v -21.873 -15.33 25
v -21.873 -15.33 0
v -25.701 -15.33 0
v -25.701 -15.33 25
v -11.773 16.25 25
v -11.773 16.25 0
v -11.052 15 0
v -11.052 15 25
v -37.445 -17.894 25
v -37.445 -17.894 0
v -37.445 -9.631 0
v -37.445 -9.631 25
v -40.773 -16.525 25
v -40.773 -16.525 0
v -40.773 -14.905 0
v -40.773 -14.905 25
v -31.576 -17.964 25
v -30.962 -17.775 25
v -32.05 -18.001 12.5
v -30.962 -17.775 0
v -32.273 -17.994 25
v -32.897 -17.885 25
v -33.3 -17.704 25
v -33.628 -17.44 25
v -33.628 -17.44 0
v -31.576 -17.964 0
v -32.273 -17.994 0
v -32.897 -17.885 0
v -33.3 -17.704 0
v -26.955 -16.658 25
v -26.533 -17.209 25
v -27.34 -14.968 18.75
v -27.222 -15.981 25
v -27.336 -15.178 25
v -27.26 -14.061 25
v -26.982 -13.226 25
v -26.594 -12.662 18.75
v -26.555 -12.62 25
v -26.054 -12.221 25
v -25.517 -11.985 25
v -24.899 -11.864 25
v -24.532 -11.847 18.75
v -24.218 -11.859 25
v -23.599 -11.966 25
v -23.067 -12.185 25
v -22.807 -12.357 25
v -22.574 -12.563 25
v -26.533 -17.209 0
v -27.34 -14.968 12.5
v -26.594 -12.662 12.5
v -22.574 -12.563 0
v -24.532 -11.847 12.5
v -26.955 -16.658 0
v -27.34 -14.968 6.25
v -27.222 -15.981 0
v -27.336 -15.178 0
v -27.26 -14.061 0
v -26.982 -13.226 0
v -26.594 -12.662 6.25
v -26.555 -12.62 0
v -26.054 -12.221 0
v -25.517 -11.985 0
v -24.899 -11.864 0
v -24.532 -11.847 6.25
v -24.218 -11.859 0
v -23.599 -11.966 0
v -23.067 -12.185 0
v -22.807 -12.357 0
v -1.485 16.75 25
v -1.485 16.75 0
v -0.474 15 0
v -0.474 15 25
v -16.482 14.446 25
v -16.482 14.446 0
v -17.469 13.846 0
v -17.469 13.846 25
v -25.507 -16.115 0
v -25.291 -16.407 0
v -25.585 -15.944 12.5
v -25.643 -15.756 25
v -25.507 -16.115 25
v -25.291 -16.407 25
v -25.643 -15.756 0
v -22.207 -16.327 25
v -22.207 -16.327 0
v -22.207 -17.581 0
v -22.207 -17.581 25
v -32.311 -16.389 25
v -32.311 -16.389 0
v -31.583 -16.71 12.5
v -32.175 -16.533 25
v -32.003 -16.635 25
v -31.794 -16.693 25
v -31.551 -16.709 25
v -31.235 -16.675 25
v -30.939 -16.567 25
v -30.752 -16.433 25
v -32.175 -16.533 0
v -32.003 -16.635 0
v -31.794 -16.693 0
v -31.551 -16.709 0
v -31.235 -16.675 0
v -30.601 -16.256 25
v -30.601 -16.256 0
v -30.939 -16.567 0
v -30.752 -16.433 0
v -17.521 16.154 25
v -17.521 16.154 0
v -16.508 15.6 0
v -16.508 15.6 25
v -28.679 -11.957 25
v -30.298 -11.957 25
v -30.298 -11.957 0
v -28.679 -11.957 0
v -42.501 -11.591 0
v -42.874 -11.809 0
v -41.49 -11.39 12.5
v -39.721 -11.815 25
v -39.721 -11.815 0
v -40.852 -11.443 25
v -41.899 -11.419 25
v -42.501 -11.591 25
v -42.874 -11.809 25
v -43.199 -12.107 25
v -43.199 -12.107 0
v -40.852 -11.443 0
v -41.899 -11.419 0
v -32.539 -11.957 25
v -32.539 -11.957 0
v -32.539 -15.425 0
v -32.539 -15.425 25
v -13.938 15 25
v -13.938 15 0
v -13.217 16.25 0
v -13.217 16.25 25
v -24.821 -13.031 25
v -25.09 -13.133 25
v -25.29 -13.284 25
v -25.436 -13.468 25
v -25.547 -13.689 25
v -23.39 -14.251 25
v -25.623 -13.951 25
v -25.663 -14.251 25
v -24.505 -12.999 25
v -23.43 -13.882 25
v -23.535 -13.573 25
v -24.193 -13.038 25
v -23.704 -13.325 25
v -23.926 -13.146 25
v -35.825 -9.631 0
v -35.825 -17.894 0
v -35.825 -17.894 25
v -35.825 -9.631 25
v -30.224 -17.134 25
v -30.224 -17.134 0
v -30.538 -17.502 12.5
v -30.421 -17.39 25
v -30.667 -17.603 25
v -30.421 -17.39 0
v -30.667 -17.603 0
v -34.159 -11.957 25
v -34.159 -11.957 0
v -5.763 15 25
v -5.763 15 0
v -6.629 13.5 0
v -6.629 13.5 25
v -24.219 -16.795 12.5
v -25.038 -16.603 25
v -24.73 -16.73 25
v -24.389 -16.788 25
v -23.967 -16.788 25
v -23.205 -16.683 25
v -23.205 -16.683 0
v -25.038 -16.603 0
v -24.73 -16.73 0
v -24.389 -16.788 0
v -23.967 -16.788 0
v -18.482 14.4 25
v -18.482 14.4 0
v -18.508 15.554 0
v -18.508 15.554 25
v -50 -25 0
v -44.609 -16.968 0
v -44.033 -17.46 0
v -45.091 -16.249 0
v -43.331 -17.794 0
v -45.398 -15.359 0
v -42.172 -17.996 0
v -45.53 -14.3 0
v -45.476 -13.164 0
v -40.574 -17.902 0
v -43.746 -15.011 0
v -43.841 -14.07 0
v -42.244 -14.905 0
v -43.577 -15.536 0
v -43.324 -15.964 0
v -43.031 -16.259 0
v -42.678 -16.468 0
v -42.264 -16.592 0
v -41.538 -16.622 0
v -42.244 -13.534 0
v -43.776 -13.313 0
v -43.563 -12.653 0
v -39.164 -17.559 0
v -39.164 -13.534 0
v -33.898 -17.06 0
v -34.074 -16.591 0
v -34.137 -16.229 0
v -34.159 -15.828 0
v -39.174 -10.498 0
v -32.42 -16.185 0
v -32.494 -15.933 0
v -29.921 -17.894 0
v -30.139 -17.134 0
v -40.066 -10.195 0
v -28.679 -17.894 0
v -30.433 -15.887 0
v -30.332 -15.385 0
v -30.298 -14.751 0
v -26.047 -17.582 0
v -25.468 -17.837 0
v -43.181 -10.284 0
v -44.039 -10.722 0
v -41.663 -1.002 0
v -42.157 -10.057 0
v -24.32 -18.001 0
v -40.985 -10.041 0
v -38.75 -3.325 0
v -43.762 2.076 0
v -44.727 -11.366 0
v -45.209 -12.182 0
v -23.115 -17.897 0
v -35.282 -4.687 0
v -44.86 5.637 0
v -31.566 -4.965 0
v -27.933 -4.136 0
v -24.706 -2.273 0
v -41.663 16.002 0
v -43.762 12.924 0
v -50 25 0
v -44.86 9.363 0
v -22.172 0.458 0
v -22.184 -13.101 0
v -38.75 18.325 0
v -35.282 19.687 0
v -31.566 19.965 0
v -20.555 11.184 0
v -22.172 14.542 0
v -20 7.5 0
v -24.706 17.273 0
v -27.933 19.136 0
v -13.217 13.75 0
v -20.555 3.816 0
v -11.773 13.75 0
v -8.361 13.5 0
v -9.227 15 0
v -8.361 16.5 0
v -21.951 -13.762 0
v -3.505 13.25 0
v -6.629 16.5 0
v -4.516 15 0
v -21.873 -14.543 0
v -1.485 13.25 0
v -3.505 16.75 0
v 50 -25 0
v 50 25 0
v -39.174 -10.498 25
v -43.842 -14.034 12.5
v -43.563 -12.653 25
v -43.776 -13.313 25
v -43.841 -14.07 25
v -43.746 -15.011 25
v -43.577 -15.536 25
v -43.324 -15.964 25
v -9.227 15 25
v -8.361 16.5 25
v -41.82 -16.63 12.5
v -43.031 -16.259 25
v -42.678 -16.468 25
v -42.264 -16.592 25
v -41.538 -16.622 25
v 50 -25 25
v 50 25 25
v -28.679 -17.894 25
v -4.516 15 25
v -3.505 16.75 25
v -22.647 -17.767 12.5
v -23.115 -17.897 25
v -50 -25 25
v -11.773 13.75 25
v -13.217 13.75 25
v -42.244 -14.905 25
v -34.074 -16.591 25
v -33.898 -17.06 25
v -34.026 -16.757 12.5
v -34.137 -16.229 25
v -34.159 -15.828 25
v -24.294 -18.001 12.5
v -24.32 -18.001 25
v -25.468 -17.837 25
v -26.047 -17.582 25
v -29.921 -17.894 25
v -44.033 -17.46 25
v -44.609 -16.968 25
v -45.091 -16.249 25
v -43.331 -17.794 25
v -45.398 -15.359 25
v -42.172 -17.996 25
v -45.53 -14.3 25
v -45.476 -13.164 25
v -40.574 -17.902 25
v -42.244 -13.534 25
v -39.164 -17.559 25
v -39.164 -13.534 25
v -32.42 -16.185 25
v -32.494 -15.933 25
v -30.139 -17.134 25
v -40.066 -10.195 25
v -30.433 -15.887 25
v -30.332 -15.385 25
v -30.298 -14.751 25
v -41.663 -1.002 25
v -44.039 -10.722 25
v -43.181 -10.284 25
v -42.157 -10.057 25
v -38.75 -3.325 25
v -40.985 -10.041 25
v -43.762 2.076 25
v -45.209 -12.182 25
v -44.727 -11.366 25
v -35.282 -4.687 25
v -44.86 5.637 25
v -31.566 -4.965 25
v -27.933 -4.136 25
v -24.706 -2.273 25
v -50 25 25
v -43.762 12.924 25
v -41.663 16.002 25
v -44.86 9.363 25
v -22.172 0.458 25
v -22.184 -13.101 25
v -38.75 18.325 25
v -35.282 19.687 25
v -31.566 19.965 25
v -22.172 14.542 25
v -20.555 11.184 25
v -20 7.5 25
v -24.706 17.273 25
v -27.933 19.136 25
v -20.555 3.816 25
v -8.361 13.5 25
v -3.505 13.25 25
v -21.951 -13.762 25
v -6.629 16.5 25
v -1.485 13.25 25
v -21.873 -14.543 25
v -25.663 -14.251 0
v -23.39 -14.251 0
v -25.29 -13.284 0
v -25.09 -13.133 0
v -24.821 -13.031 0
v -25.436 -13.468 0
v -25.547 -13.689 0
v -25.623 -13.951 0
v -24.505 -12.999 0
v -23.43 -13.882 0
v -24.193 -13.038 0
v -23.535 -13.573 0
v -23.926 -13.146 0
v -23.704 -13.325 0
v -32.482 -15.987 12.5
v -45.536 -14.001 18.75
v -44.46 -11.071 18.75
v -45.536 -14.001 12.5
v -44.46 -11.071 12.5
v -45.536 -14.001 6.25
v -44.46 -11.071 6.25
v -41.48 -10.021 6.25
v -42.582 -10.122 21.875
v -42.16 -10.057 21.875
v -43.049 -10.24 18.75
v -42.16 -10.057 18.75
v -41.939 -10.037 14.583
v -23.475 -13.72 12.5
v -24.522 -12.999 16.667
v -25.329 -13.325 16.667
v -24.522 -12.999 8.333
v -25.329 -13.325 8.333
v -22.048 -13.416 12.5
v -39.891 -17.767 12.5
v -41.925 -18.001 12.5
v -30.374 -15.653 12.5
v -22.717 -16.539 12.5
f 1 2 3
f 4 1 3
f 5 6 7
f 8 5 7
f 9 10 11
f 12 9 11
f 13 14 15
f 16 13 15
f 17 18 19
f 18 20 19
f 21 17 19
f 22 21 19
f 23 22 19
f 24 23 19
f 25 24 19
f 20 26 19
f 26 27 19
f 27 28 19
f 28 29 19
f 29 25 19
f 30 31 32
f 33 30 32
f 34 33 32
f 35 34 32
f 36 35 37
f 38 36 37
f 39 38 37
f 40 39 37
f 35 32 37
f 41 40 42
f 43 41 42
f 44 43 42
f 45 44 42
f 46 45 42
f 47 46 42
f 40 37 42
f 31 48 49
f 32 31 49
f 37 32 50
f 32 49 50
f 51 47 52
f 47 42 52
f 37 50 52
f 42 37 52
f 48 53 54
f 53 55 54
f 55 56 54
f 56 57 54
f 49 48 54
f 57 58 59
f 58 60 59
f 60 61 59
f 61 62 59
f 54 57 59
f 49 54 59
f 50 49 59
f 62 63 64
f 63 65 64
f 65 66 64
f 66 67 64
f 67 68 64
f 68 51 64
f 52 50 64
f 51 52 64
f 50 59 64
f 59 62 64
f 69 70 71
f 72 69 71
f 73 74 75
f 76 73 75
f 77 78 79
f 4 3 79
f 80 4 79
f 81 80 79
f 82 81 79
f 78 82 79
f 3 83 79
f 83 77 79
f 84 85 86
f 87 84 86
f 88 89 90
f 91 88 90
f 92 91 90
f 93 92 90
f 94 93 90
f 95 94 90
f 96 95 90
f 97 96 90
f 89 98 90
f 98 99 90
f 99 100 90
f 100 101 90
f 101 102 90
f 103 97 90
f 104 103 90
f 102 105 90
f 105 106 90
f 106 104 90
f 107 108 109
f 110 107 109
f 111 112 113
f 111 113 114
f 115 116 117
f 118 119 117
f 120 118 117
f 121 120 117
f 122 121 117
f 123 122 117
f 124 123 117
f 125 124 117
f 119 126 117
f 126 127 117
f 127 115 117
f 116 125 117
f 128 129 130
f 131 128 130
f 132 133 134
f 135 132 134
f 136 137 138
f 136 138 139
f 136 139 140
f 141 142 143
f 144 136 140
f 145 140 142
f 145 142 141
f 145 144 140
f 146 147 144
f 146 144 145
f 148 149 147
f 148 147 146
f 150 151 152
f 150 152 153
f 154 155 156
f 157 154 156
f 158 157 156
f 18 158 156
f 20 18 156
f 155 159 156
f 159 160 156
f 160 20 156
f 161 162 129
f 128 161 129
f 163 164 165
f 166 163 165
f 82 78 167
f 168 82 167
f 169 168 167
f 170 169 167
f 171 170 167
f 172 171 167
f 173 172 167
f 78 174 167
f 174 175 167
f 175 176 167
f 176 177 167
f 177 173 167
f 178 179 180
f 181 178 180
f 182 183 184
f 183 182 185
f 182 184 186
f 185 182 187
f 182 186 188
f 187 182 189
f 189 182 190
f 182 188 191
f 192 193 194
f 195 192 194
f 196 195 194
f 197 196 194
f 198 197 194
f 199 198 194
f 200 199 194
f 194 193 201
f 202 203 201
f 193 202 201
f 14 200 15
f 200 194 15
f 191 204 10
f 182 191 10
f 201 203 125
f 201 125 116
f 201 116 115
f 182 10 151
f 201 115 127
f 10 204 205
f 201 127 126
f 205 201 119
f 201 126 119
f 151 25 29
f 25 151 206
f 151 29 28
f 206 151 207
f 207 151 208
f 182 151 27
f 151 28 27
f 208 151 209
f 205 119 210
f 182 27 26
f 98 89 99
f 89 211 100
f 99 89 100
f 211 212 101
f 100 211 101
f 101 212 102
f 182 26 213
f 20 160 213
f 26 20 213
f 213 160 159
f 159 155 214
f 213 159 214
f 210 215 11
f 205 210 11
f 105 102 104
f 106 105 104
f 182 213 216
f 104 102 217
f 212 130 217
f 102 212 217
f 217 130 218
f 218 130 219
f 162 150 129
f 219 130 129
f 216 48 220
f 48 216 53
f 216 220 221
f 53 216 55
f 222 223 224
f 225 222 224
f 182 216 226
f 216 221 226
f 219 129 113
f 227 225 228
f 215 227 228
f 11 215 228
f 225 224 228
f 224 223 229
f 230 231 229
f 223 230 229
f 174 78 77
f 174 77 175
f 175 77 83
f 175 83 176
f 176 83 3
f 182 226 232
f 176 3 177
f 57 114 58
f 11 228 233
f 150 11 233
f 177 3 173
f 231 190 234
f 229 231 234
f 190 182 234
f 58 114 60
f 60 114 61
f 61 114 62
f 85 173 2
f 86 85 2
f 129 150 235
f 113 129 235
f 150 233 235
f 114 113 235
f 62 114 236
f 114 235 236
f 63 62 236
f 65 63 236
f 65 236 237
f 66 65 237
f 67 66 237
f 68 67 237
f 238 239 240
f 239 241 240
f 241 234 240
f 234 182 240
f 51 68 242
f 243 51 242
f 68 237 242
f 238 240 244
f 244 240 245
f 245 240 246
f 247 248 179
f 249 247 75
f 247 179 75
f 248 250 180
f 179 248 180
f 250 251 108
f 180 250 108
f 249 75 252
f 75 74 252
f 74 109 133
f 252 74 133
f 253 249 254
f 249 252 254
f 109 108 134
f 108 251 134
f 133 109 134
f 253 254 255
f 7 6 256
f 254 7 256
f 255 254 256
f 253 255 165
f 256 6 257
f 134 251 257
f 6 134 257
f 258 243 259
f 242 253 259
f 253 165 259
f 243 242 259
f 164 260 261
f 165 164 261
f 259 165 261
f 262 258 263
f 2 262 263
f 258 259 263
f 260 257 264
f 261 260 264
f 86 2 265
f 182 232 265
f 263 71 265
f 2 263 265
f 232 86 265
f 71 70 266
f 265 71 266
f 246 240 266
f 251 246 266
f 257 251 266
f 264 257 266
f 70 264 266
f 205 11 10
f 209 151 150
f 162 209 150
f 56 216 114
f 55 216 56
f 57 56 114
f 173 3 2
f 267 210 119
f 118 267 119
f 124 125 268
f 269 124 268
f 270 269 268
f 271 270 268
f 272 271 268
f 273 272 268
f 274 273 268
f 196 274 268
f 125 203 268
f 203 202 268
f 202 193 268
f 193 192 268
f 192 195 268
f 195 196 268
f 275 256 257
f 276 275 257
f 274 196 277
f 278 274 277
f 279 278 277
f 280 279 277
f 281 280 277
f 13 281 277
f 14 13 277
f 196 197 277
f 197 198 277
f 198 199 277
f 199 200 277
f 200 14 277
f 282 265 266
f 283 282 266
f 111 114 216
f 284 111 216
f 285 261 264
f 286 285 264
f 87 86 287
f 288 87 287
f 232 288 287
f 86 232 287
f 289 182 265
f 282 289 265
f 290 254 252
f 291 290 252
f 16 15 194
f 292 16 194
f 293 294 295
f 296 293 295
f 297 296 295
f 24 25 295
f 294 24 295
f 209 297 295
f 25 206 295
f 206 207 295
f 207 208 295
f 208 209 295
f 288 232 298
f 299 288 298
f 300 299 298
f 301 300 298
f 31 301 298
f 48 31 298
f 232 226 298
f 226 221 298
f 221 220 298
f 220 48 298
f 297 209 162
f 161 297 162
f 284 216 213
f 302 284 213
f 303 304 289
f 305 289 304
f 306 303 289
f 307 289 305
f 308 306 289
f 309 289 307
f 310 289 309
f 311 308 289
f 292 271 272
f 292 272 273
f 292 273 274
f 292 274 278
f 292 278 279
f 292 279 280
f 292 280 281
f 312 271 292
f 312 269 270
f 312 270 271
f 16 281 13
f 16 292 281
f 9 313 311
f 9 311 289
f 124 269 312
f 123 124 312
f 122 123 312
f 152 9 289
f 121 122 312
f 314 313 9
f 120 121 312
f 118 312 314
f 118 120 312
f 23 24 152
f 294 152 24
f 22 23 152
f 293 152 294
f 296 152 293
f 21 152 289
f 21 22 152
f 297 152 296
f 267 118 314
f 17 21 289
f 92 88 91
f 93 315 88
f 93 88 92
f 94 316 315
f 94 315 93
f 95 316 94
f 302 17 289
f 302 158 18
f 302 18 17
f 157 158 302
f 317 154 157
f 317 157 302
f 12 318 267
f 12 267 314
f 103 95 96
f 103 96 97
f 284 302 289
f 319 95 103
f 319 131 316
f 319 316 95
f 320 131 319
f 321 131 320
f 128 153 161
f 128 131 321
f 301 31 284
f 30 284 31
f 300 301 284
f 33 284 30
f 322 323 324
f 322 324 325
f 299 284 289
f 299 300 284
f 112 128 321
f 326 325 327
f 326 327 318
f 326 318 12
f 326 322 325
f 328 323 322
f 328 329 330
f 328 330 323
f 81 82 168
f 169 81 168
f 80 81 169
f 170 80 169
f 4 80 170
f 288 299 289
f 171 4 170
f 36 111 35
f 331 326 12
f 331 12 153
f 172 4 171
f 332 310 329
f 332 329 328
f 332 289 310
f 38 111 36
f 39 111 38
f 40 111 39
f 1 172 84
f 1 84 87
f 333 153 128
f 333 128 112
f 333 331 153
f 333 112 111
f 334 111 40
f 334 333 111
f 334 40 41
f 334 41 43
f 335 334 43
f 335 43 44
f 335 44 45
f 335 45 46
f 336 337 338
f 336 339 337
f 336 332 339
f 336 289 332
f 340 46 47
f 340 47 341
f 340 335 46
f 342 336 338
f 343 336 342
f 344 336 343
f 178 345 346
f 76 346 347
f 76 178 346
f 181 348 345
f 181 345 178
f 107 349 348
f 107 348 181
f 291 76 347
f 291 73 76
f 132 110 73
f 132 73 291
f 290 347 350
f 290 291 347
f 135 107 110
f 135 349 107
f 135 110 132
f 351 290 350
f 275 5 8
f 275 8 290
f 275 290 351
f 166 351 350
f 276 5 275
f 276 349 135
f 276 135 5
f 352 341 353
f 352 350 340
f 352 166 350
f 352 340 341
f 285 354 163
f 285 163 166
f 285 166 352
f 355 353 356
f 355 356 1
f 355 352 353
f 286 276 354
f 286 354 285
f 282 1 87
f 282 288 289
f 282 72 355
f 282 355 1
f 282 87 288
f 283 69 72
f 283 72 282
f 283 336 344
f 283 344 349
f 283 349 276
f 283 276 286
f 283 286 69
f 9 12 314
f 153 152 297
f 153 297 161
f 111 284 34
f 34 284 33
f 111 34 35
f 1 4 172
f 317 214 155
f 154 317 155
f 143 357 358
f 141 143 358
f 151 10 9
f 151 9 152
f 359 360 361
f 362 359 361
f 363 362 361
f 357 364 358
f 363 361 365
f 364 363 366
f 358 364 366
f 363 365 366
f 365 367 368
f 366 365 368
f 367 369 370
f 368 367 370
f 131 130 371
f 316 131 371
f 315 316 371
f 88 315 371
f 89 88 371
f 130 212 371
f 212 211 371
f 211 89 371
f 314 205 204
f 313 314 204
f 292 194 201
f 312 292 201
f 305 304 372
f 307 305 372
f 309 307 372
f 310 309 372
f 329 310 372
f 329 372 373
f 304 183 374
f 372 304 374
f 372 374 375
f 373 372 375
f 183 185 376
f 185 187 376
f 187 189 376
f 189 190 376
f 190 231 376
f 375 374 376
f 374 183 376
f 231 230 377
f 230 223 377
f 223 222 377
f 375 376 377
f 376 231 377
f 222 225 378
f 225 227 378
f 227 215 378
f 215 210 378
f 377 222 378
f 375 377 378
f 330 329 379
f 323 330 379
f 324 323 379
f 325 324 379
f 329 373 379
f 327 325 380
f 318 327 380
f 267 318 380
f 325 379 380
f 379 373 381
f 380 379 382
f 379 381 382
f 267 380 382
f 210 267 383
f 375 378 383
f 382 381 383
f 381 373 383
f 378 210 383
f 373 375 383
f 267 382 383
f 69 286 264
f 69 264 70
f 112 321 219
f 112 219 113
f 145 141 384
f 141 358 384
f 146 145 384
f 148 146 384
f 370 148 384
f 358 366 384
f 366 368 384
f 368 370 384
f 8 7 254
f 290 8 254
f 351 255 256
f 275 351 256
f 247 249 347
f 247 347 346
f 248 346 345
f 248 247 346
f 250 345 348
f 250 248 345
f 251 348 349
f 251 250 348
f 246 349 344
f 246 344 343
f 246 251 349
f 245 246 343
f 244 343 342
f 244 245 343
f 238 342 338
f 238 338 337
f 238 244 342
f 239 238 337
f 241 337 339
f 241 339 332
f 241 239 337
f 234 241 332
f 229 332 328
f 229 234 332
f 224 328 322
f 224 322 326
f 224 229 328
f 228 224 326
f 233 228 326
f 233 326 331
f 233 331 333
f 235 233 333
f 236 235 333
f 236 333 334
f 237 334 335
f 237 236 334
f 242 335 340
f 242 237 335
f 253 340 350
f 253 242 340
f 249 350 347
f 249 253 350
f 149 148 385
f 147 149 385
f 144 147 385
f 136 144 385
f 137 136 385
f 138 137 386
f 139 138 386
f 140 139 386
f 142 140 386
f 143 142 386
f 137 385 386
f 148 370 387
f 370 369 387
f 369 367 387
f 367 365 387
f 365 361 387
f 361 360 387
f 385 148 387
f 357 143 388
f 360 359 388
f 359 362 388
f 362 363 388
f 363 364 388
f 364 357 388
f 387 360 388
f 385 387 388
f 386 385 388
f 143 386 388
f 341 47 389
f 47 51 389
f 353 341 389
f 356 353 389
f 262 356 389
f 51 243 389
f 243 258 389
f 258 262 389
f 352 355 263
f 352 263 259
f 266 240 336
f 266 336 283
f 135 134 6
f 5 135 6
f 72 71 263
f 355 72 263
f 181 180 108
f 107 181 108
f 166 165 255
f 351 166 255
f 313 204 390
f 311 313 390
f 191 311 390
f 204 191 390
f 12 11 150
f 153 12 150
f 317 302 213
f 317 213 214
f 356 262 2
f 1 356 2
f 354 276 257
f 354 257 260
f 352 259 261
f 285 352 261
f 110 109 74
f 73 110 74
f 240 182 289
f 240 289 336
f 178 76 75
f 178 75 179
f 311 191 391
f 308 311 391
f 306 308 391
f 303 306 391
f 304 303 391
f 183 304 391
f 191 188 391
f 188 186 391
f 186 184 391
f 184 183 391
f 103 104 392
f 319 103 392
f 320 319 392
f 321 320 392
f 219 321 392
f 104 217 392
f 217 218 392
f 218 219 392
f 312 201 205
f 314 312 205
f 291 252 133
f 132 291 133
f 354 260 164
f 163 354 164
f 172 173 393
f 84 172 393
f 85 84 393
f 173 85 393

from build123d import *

# Parameters (mm, degrees)
F0_W     = 100
F0_H     = 50
F0_W_2   = 1.6192061982
F0_H_2   = 8.2625390784
F0_R     = 12.5
F1_DEPTH = 25


with BuildPart() as f1:
    # F0 (on Top) → F1 (new body)
    with BuildSketch(Plane.XY):
        Rectangle(F0_W, F0_H)
        with BuildLine():
            Line((-42.2444701954, -14.905312297), (-42.2444701954, -13.534169168))
            Line((-42.2444701954, -13.534169168), (-39.164070576, -13.534169168))
            Line((-39.164070576, -13.534169168), (-39.164070576, -17.5592473249))
            add(Edge.make_bspline(
                [(-39.164070576, -17.5592473249), (-39.9133569699, -17.8039122698), (-40.5742921337, -17.9024578727)],
                knots=[0, 0, 0, 1, 1, 1], degree=2))
            add(Edge.make_bspline(
                [(-40.5742921337, -17.9024578727), (-41.2352272975, -18.0010034755), (-41.9250465173, -18.0010034755)],
                knots=[0, 0, 0, 1, 1, 1], degree=2))
            add(Edge.make_bspline(
                [(-41.9250465173, -18.0010034755), (-43.681876747, -18.0010034755), (-44.6087151322, -16.9679737079)],
                knots=[0, 0, 0, 1, 1, 1], degree=2))
            add(Edge.make_bspline(
                [(-44.6087151322, -16.9679737079), (-45.5355535174, -15.9349439404), (-45.5355535174, -14.0014112504)],
                knots=[0, 0, 0, 1, 1, 1], degree=2))
            add(Edge.make_bspline(
                [(-45.5355535174, -14.0014112504), (-45.5355535174, -12.1222485482), (-44.4600471969, -11.0713786284)],
                knots=[0, 0, 0, 1, 1, 1], degree=2))
            add(Edge.make_bspline(
                [(-44.4600471969, -11.0713786284), (-43.3845408764, -10.0205087086), (-41.4798922425, -10.0205087086)],
                knots=[0, 0, 0, 1, 1, 1], degree=2))
            add(Edge.make_bspline(
                [(-41.4798922425, -10.0205087086), (-40.2837525116, -10.0205087086), (-39.1742649487, -10.4979451637)],
                knots=[0, 0, 0, 1, 1, 1], degree=2))
            Line((-39.1742649487, -10.4979451637), (-39.7213629506, -11.8147183049))
            add(Edge.make_bspline(
                [(-39.7213629506, -11.8147183049), (-40.5708940095, -11.3899527755), (-41.4900866152, -11.3899527755)],
                knots=[0, 0, 0, 1, 1, 1], degree=2))
            add(Edge.make_bspline(
                [(-41.4900866152, -11.3899527755), (-42.5570976251, -11.3899527755), (-43.1993431056, -12.1069569892)],
                knots=[0, 0, 0, 1, 1, 1], degree=2))
            add(Edge.make_bspline(
                [(-43.1993431056, -12.1069569892), (-43.8415885861, -12.8239612028), (-43.8415885861, -14.0336934306)],
                knots=[0, 0, 0, 1, 1, 1], degree=2))
            add(Edge.make_bspline(
                [(-43.8415885861, -14.0336934306), (-43.8415885861, -15.2977956462), (-43.3242241712, -15.9638279964)],
                knots=[0, 0, 0, 1, 1, 1], degree=2))
            add(Edge.make_bspline(
                [(-43.3242241712, -15.9638279964), (-42.8068597564, -16.6298603465), (-41.819704666, -16.6298603465)],
                knots=[0, 0, 0, 1, 1, 1], degree=2))
            add(Edge.make_bspline(
                [(-41.819704666, -16.6298603465), (-41.3031897822, -16.6298603465), (-40.7730824015, -16.5245184952)],
                knots=[0, 0, 0, 1, 1, 1], degree=2))
            Line((-40.7730824015, -16.5245184952), (-40.7730824015, -14.905312297))
            Line((-40.7730824015, -14.905312297), (-42.2444701954, -14.905312297))
        make_face(mode=Mode.SUBTRACT)
        with BuildLine():
            Line((-28.6791582476, -17.8939625621), (-29.9211726557, -17.8939625621))
            Line((-29.9211726557, -17.8939625621), (-30.1386526067, -17.1344817955))
            Line((-30.1386526067, -17.1344817955), (-30.2236057126, -17.1344817955))
            add(Edge.make_bspline(
                [(-30.2236057126, -17.1344817955), (-30.4835622166, -17.5490529522), (-30.9618482028, -17.7750282138)],
                knots=[0, 0, 0, 1, 1, 1], degree=2))
            add(Edge.make_bspline(
                [(-30.9618482028, -17.7750282138), (-31.4401341889, -18.0010034755), (-32.0500974892, -18.0010034755)],
                knots=[0, 0, 0, 1, 1, 1], degree=2))
            add(Edge.make_bspline(
                [(-32.0500974892, -18.0010034755), (-33.0967197537, -18.0010034755), (-33.6276766655, -17.4403129767)],
                knots=[0, 0, 0, 1, 1, 1], degree=2))
            add(Edge.make_bspline(
                [(-33.6276766655, -17.4403129767), (-34.1586335772, -16.8796224778), (-34.1586335772, -15.8279030269)],
                knots=[0, 0, 0, 1, 1, 1], degree=2))
            Line((-34.1586335772, -15.8279030269), (-34.1586335772, -11.9574395228))
            Line((-34.1586335772, -11.9574395228), (-32.5394273791, -11.9574395228))
            Line((-32.5394273791, -11.9574395228), (-32.5394273791, -15.4252253051))
            add(Edge.make_bspline(
                [(-32.5394273791, -15.4252253051), (-32.5394273791, -16.0674707855), (-32.3109035242, -16.3885935258)],
                knots=[0, 0, 0, 1, 1, 1], degree=2))
            add(Edge.make_bspline(
                [(-32.3109035242, -16.3885935258), (-32.0823796694, -16.709716266), (-31.5828554068, -16.709716266)],
                knots=[0, 0, 0, 1, 1, 1], degree=2))
            add(Edge.make_bspline(
                [(-31.5828554068, -16.709716266), (-30.9032305597, -16.709716266), (-30.6007975028, -16.2560666806)],
                knots=[0, 0, 0, 1, 1, 1], degree=2))
            add(Edge.make_bspline(
                [(-30.6007975028, -16.2560666806), (-30.2983644458, -15.8024170952), (-30.2983644458, -14.7506976443)],
                knots=[0, 0, 0, 1, 1, 1], degree=2))
            Line((-30.2983644458, -14.7506976443), (-30.2983644458, -11.9574395228))
            Line((-30.2983644458, -11.9574395228), (-28.6791582476, -11.9574395228))
            Line((-28.6791582476, -11.9574395228), (-28.6791582476, -17.8939625621))
        make_face(mode=Mode.SUBTRACT)
        with Locations((-36.6350166138, -13.7626930229)):
            Rectangle(F0_W_2, F0_H_2, mode=Mode.SUBTRACT)
        with BuildLine():
            add(Edge.make_bspline(
                [(-23.1147298121, -17.8973606863), (-23.5972634536, -18.0010034755), (-24.2938789218, -18.0010034755)],
                knots=[0, 0, 0, 1, 1, 1], degree=2))
            add(Edge.make_bspline(
                [(-24.2938789218, -18.0010034755), (-25.726188287, -18.0010034755), (-26.533242793, -17.2092405286)],
                knots=[0, 0, 0, 1, 1, 1], degree=2))
            add(Edge.make_bspline(
                [(-26.533242793, -17.2092405286), (-27.3402972989, -16.4174775818), (-27.3402972989, -14.9681775954)],
                knots=[0, 0, 0, 1, 1, 1], degree=2))
            add(Edge.make_bspline(
                [(-27.3402972989, -14.9681775954), (-27.3402972989, -13.476401056), (-26.5944090292, -12.6617007706)],
                knots=[0, 0, 0, 1, 1, 1], degree=2))
            add(Edge.make_bspline(
                [(-26.5944090292, -12.6617007706), (-25.8485207595, -11.8470004852), (-24.5317476183, -11.8470004852)],
                knots=[0, 0, 0, 1, 1, 1], degree=2))
            add(Edge.make_bspline(
                [(-24.5317476183, -11.8470004852), (-23.2744416512, -11.8470004852), (-22.5735785276, -12.5631551678)],
                knots=[0, 0, 0, 1, 1, 1], degree=2))
            add(Edge.make_bspline(
                [(-22.5735785276, -12.5631551678), (-21.8727154041, -13.2793098504), (-21.8727154041, -14.543412066)],
                knots=[0, 0, 0, 1, 1, 1], degree=2))
            Line((-21.8727154041, -14.543412066), (-21.8727154041, -15.3300778265))
            Line((-21.8727154041, -15.3300778265), (-25.7007023553, -15.3300778265))
            add(Edge.make_bspline(
                [(-25.7007023553, -15.3300778265), (-25.6735173614, -16.0198970462), (-25.2912283849, -16.4072832091)],
                knots=[0, 0, 0, 1, 1, 1], degree=2))
            add(Edge.make_bspline(
                [(-25.2912283849, -16.4072832091), (-24.9089394084, -16.7946693719), (-24.2191201886, -16.7946693719)],
                knots=[0, 0, 0, 1, 1, 1], degree=2))
            add(Edge.make_bspline(
                [(-24.2191201886, -16.7946693719), (-23.6822165594, -16.7946693719), (-23.2047801044, -16.6833808032)],
                knots=[0, 0, 0, 1, 1, 1], degree=2))
            add(Edge.make_bspline(
                [(-23.2047801044, -16.6833808032), (-22.7273436493, -16.5720922345), (-22.2074306413, -16.3274272896)],
                knots=[0, 0, 0, 1, 1, 1], degree=2))
            Line((-22.2074306413, -16.3274272896), (-22.2074306413, -17.5813351324))
            add(Edge.make_bspline(
                [(-22.2074306413, -17.5813351324), (-22.6321961707, -17.7937178971), (-23.1147298121, -17.8973606863)],
                knots=[0, 0, 0, 1, 1, 1], degree=2))
        make_face(mode=Mode.SUBTRACT)
        with Locations((-32.5, 7.5)):
            Circle(F0_R, mode=Mode.SUBTRACT)
        Polygon((-16.5084793183, 15.6000386243), (-16.4821071673, 14.4456392813), (-17.4686602488, 13.8456006571), (-18.4815854815, 14.3999613757), (-18.5079576325, 15.5543607187), (-17.521404551, 16.1543993429), align=None, mode=Mode.SUBTRACT)
        Polygon((-13.9384080729, 15), (-13.2167202364, 16.25), (-11.7733445634, 16.25), (-11.0516567269, 15), (-11.7733445634, 13.75), (-13.2167202364, 13.75), align=None, mode=Mode.SUBTRACT)
        Polygon((-6.6290069961, 16.5), (-5.7629815923, 15), (-6.6290069961, 13.5), (-8.3610578037, 13.5), (-9.2270832075, 15), (-8.3610578037, 16.5), align=None, mode=Mode.SUBTRACT)
        Polygon((-1.4846694288, 16.75), (-0.4743064577, 15), (-1.4846694288, 13.25), (-3.505395371, 13.25), (-4.5157583421, 15), (-3.505395371, 16.75), align=None, mode=Mode.SUBTRACT)
    extrude(amount=F1_DEPTH)


with BuildPart() as f1b:
    # F0 (on Top) → F1, piece 2 (new body)
    with BuildSketch(Plane.XY):
        with BuildLine():
            add(Edge.make_bspline(
                [(-23.704304367, -13.3251845276), (-24.0067374239, -12.998964601), (-24.5215532456, -12.998964601)],
                knots=[0, 0, 0, 1, 1, 1], degree=2))
            add(Edge.make_bspline(
                [(-24.5215532456, -12.998964601), (-25.0363690673, -12.998964601), (-25.3286077515, -13.3251845276)],
                knots=[0, 0, 0, 1, 1, 1], degree=2))
            add(Edge.make_bspline(
                [(-25.3286077515, -13.3251845276), (-25.6208464357, -13.6514044542), (-25.6633229887, -14.2511733817)],
                knots=[0, 0, 0, 1, 1, 1], degree=2))
            Line((-25.6633229887, -14.2511733817), (-23.3899778752, -14.2511733817))
            add(Edge.make_bspline(
                [(-23.3899778752, -14.2511733817), (-23.40187131, -13.6514044542), (-23.704304367, -13.3251845276)],
                knots=[0, 0, 0, 1, 1, 1], degree=2))
        make_face()
    extrude(amount=F1_DEPTH)


solid = Compound([f1.part, f1b.part])
